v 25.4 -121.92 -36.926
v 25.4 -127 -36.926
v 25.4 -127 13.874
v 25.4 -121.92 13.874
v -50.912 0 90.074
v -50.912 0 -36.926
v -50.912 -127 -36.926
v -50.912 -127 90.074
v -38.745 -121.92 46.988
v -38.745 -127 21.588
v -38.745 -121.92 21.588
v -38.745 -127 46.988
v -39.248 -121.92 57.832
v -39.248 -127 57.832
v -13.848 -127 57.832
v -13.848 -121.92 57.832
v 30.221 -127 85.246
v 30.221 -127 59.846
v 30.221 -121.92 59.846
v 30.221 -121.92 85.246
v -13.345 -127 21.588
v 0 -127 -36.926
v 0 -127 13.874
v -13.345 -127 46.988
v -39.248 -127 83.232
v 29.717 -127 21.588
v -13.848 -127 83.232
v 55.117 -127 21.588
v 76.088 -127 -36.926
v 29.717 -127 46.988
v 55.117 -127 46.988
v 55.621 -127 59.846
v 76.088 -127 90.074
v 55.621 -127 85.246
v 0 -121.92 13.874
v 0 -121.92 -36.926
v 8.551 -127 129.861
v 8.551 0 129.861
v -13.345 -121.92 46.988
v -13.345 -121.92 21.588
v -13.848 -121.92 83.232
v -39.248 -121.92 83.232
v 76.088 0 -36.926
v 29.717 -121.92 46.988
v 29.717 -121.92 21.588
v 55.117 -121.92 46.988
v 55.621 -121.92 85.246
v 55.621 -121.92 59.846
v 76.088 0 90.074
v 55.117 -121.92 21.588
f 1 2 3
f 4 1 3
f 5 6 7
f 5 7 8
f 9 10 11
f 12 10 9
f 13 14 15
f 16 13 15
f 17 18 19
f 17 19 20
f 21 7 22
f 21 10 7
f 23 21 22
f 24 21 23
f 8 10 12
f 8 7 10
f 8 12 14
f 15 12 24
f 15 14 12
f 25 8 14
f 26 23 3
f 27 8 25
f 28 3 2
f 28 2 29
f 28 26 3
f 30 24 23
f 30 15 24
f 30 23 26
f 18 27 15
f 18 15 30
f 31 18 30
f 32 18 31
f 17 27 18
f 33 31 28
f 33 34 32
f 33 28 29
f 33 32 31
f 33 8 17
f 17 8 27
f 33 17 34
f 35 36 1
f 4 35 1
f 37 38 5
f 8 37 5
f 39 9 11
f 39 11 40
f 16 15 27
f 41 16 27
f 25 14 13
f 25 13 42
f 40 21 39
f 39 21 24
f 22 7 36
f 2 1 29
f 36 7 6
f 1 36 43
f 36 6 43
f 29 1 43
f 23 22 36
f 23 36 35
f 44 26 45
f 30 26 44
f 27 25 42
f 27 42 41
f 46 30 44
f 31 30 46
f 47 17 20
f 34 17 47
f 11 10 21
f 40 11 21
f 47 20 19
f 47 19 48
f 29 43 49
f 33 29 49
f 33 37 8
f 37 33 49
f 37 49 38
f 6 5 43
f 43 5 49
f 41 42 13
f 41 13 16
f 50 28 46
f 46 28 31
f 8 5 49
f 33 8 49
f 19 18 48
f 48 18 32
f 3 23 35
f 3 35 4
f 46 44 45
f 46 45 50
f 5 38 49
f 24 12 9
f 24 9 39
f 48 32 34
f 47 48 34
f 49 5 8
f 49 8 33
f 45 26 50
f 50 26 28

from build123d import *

# Parameters (mm, degrees)
F0_W     = 127
F0_H     = 127
F1_DEPTH = 127
F2_W     = 25.4
F2_H     = 25.4
F2_H_2   = 50.8
F3_DEPTH = 5.08
F5_DEPTH = 127


with BuildPart() as f1:
    # F0 (on Front) → F1 (new body)
    with BuildSketch(Plane.XZ):
        with Locations((12.588286, 26.574241)):
            Rectangle(F0_W, F0_H)
    extrude(amount=F1_DEPTH)

    # F2 (on face) → F3 (cut)
    with BuildSketch(Plane.XZ.offset(127)):
        with Locations((-26.548444, 70.532424)):
            Rectangle(F2_W, F2_H)
        with Locations((-26.045046, 34.287646)):
            Rectangle(F2_W, F2_H)
        with Locations((12.7, -11.525759)):
            Rectangle(F2_W, F2_H_2)
        with Locations((42.417306, 34.287646)):
            Rectangle(F2_W, F2_H)
        with Locations((42.920702, 72.546018)):
            Rectangle(F2_W, F2_H)
    extrude(amount=-F3_DEPTH, mode=Mode.SUBTRACT)


with BuildPart() as f5:
    # F4 (on face) → F5 (new body)
    with BuildSketch(Plane.XZ.offset(127)):
        Polygon((8.551238, 129.861295), (-50.911714, 90.074241), (76.088286, 90.074241), align=None)
    extrude(amount=-F5_DEPTH)


solid = Compound([f1.part, f5.part])
